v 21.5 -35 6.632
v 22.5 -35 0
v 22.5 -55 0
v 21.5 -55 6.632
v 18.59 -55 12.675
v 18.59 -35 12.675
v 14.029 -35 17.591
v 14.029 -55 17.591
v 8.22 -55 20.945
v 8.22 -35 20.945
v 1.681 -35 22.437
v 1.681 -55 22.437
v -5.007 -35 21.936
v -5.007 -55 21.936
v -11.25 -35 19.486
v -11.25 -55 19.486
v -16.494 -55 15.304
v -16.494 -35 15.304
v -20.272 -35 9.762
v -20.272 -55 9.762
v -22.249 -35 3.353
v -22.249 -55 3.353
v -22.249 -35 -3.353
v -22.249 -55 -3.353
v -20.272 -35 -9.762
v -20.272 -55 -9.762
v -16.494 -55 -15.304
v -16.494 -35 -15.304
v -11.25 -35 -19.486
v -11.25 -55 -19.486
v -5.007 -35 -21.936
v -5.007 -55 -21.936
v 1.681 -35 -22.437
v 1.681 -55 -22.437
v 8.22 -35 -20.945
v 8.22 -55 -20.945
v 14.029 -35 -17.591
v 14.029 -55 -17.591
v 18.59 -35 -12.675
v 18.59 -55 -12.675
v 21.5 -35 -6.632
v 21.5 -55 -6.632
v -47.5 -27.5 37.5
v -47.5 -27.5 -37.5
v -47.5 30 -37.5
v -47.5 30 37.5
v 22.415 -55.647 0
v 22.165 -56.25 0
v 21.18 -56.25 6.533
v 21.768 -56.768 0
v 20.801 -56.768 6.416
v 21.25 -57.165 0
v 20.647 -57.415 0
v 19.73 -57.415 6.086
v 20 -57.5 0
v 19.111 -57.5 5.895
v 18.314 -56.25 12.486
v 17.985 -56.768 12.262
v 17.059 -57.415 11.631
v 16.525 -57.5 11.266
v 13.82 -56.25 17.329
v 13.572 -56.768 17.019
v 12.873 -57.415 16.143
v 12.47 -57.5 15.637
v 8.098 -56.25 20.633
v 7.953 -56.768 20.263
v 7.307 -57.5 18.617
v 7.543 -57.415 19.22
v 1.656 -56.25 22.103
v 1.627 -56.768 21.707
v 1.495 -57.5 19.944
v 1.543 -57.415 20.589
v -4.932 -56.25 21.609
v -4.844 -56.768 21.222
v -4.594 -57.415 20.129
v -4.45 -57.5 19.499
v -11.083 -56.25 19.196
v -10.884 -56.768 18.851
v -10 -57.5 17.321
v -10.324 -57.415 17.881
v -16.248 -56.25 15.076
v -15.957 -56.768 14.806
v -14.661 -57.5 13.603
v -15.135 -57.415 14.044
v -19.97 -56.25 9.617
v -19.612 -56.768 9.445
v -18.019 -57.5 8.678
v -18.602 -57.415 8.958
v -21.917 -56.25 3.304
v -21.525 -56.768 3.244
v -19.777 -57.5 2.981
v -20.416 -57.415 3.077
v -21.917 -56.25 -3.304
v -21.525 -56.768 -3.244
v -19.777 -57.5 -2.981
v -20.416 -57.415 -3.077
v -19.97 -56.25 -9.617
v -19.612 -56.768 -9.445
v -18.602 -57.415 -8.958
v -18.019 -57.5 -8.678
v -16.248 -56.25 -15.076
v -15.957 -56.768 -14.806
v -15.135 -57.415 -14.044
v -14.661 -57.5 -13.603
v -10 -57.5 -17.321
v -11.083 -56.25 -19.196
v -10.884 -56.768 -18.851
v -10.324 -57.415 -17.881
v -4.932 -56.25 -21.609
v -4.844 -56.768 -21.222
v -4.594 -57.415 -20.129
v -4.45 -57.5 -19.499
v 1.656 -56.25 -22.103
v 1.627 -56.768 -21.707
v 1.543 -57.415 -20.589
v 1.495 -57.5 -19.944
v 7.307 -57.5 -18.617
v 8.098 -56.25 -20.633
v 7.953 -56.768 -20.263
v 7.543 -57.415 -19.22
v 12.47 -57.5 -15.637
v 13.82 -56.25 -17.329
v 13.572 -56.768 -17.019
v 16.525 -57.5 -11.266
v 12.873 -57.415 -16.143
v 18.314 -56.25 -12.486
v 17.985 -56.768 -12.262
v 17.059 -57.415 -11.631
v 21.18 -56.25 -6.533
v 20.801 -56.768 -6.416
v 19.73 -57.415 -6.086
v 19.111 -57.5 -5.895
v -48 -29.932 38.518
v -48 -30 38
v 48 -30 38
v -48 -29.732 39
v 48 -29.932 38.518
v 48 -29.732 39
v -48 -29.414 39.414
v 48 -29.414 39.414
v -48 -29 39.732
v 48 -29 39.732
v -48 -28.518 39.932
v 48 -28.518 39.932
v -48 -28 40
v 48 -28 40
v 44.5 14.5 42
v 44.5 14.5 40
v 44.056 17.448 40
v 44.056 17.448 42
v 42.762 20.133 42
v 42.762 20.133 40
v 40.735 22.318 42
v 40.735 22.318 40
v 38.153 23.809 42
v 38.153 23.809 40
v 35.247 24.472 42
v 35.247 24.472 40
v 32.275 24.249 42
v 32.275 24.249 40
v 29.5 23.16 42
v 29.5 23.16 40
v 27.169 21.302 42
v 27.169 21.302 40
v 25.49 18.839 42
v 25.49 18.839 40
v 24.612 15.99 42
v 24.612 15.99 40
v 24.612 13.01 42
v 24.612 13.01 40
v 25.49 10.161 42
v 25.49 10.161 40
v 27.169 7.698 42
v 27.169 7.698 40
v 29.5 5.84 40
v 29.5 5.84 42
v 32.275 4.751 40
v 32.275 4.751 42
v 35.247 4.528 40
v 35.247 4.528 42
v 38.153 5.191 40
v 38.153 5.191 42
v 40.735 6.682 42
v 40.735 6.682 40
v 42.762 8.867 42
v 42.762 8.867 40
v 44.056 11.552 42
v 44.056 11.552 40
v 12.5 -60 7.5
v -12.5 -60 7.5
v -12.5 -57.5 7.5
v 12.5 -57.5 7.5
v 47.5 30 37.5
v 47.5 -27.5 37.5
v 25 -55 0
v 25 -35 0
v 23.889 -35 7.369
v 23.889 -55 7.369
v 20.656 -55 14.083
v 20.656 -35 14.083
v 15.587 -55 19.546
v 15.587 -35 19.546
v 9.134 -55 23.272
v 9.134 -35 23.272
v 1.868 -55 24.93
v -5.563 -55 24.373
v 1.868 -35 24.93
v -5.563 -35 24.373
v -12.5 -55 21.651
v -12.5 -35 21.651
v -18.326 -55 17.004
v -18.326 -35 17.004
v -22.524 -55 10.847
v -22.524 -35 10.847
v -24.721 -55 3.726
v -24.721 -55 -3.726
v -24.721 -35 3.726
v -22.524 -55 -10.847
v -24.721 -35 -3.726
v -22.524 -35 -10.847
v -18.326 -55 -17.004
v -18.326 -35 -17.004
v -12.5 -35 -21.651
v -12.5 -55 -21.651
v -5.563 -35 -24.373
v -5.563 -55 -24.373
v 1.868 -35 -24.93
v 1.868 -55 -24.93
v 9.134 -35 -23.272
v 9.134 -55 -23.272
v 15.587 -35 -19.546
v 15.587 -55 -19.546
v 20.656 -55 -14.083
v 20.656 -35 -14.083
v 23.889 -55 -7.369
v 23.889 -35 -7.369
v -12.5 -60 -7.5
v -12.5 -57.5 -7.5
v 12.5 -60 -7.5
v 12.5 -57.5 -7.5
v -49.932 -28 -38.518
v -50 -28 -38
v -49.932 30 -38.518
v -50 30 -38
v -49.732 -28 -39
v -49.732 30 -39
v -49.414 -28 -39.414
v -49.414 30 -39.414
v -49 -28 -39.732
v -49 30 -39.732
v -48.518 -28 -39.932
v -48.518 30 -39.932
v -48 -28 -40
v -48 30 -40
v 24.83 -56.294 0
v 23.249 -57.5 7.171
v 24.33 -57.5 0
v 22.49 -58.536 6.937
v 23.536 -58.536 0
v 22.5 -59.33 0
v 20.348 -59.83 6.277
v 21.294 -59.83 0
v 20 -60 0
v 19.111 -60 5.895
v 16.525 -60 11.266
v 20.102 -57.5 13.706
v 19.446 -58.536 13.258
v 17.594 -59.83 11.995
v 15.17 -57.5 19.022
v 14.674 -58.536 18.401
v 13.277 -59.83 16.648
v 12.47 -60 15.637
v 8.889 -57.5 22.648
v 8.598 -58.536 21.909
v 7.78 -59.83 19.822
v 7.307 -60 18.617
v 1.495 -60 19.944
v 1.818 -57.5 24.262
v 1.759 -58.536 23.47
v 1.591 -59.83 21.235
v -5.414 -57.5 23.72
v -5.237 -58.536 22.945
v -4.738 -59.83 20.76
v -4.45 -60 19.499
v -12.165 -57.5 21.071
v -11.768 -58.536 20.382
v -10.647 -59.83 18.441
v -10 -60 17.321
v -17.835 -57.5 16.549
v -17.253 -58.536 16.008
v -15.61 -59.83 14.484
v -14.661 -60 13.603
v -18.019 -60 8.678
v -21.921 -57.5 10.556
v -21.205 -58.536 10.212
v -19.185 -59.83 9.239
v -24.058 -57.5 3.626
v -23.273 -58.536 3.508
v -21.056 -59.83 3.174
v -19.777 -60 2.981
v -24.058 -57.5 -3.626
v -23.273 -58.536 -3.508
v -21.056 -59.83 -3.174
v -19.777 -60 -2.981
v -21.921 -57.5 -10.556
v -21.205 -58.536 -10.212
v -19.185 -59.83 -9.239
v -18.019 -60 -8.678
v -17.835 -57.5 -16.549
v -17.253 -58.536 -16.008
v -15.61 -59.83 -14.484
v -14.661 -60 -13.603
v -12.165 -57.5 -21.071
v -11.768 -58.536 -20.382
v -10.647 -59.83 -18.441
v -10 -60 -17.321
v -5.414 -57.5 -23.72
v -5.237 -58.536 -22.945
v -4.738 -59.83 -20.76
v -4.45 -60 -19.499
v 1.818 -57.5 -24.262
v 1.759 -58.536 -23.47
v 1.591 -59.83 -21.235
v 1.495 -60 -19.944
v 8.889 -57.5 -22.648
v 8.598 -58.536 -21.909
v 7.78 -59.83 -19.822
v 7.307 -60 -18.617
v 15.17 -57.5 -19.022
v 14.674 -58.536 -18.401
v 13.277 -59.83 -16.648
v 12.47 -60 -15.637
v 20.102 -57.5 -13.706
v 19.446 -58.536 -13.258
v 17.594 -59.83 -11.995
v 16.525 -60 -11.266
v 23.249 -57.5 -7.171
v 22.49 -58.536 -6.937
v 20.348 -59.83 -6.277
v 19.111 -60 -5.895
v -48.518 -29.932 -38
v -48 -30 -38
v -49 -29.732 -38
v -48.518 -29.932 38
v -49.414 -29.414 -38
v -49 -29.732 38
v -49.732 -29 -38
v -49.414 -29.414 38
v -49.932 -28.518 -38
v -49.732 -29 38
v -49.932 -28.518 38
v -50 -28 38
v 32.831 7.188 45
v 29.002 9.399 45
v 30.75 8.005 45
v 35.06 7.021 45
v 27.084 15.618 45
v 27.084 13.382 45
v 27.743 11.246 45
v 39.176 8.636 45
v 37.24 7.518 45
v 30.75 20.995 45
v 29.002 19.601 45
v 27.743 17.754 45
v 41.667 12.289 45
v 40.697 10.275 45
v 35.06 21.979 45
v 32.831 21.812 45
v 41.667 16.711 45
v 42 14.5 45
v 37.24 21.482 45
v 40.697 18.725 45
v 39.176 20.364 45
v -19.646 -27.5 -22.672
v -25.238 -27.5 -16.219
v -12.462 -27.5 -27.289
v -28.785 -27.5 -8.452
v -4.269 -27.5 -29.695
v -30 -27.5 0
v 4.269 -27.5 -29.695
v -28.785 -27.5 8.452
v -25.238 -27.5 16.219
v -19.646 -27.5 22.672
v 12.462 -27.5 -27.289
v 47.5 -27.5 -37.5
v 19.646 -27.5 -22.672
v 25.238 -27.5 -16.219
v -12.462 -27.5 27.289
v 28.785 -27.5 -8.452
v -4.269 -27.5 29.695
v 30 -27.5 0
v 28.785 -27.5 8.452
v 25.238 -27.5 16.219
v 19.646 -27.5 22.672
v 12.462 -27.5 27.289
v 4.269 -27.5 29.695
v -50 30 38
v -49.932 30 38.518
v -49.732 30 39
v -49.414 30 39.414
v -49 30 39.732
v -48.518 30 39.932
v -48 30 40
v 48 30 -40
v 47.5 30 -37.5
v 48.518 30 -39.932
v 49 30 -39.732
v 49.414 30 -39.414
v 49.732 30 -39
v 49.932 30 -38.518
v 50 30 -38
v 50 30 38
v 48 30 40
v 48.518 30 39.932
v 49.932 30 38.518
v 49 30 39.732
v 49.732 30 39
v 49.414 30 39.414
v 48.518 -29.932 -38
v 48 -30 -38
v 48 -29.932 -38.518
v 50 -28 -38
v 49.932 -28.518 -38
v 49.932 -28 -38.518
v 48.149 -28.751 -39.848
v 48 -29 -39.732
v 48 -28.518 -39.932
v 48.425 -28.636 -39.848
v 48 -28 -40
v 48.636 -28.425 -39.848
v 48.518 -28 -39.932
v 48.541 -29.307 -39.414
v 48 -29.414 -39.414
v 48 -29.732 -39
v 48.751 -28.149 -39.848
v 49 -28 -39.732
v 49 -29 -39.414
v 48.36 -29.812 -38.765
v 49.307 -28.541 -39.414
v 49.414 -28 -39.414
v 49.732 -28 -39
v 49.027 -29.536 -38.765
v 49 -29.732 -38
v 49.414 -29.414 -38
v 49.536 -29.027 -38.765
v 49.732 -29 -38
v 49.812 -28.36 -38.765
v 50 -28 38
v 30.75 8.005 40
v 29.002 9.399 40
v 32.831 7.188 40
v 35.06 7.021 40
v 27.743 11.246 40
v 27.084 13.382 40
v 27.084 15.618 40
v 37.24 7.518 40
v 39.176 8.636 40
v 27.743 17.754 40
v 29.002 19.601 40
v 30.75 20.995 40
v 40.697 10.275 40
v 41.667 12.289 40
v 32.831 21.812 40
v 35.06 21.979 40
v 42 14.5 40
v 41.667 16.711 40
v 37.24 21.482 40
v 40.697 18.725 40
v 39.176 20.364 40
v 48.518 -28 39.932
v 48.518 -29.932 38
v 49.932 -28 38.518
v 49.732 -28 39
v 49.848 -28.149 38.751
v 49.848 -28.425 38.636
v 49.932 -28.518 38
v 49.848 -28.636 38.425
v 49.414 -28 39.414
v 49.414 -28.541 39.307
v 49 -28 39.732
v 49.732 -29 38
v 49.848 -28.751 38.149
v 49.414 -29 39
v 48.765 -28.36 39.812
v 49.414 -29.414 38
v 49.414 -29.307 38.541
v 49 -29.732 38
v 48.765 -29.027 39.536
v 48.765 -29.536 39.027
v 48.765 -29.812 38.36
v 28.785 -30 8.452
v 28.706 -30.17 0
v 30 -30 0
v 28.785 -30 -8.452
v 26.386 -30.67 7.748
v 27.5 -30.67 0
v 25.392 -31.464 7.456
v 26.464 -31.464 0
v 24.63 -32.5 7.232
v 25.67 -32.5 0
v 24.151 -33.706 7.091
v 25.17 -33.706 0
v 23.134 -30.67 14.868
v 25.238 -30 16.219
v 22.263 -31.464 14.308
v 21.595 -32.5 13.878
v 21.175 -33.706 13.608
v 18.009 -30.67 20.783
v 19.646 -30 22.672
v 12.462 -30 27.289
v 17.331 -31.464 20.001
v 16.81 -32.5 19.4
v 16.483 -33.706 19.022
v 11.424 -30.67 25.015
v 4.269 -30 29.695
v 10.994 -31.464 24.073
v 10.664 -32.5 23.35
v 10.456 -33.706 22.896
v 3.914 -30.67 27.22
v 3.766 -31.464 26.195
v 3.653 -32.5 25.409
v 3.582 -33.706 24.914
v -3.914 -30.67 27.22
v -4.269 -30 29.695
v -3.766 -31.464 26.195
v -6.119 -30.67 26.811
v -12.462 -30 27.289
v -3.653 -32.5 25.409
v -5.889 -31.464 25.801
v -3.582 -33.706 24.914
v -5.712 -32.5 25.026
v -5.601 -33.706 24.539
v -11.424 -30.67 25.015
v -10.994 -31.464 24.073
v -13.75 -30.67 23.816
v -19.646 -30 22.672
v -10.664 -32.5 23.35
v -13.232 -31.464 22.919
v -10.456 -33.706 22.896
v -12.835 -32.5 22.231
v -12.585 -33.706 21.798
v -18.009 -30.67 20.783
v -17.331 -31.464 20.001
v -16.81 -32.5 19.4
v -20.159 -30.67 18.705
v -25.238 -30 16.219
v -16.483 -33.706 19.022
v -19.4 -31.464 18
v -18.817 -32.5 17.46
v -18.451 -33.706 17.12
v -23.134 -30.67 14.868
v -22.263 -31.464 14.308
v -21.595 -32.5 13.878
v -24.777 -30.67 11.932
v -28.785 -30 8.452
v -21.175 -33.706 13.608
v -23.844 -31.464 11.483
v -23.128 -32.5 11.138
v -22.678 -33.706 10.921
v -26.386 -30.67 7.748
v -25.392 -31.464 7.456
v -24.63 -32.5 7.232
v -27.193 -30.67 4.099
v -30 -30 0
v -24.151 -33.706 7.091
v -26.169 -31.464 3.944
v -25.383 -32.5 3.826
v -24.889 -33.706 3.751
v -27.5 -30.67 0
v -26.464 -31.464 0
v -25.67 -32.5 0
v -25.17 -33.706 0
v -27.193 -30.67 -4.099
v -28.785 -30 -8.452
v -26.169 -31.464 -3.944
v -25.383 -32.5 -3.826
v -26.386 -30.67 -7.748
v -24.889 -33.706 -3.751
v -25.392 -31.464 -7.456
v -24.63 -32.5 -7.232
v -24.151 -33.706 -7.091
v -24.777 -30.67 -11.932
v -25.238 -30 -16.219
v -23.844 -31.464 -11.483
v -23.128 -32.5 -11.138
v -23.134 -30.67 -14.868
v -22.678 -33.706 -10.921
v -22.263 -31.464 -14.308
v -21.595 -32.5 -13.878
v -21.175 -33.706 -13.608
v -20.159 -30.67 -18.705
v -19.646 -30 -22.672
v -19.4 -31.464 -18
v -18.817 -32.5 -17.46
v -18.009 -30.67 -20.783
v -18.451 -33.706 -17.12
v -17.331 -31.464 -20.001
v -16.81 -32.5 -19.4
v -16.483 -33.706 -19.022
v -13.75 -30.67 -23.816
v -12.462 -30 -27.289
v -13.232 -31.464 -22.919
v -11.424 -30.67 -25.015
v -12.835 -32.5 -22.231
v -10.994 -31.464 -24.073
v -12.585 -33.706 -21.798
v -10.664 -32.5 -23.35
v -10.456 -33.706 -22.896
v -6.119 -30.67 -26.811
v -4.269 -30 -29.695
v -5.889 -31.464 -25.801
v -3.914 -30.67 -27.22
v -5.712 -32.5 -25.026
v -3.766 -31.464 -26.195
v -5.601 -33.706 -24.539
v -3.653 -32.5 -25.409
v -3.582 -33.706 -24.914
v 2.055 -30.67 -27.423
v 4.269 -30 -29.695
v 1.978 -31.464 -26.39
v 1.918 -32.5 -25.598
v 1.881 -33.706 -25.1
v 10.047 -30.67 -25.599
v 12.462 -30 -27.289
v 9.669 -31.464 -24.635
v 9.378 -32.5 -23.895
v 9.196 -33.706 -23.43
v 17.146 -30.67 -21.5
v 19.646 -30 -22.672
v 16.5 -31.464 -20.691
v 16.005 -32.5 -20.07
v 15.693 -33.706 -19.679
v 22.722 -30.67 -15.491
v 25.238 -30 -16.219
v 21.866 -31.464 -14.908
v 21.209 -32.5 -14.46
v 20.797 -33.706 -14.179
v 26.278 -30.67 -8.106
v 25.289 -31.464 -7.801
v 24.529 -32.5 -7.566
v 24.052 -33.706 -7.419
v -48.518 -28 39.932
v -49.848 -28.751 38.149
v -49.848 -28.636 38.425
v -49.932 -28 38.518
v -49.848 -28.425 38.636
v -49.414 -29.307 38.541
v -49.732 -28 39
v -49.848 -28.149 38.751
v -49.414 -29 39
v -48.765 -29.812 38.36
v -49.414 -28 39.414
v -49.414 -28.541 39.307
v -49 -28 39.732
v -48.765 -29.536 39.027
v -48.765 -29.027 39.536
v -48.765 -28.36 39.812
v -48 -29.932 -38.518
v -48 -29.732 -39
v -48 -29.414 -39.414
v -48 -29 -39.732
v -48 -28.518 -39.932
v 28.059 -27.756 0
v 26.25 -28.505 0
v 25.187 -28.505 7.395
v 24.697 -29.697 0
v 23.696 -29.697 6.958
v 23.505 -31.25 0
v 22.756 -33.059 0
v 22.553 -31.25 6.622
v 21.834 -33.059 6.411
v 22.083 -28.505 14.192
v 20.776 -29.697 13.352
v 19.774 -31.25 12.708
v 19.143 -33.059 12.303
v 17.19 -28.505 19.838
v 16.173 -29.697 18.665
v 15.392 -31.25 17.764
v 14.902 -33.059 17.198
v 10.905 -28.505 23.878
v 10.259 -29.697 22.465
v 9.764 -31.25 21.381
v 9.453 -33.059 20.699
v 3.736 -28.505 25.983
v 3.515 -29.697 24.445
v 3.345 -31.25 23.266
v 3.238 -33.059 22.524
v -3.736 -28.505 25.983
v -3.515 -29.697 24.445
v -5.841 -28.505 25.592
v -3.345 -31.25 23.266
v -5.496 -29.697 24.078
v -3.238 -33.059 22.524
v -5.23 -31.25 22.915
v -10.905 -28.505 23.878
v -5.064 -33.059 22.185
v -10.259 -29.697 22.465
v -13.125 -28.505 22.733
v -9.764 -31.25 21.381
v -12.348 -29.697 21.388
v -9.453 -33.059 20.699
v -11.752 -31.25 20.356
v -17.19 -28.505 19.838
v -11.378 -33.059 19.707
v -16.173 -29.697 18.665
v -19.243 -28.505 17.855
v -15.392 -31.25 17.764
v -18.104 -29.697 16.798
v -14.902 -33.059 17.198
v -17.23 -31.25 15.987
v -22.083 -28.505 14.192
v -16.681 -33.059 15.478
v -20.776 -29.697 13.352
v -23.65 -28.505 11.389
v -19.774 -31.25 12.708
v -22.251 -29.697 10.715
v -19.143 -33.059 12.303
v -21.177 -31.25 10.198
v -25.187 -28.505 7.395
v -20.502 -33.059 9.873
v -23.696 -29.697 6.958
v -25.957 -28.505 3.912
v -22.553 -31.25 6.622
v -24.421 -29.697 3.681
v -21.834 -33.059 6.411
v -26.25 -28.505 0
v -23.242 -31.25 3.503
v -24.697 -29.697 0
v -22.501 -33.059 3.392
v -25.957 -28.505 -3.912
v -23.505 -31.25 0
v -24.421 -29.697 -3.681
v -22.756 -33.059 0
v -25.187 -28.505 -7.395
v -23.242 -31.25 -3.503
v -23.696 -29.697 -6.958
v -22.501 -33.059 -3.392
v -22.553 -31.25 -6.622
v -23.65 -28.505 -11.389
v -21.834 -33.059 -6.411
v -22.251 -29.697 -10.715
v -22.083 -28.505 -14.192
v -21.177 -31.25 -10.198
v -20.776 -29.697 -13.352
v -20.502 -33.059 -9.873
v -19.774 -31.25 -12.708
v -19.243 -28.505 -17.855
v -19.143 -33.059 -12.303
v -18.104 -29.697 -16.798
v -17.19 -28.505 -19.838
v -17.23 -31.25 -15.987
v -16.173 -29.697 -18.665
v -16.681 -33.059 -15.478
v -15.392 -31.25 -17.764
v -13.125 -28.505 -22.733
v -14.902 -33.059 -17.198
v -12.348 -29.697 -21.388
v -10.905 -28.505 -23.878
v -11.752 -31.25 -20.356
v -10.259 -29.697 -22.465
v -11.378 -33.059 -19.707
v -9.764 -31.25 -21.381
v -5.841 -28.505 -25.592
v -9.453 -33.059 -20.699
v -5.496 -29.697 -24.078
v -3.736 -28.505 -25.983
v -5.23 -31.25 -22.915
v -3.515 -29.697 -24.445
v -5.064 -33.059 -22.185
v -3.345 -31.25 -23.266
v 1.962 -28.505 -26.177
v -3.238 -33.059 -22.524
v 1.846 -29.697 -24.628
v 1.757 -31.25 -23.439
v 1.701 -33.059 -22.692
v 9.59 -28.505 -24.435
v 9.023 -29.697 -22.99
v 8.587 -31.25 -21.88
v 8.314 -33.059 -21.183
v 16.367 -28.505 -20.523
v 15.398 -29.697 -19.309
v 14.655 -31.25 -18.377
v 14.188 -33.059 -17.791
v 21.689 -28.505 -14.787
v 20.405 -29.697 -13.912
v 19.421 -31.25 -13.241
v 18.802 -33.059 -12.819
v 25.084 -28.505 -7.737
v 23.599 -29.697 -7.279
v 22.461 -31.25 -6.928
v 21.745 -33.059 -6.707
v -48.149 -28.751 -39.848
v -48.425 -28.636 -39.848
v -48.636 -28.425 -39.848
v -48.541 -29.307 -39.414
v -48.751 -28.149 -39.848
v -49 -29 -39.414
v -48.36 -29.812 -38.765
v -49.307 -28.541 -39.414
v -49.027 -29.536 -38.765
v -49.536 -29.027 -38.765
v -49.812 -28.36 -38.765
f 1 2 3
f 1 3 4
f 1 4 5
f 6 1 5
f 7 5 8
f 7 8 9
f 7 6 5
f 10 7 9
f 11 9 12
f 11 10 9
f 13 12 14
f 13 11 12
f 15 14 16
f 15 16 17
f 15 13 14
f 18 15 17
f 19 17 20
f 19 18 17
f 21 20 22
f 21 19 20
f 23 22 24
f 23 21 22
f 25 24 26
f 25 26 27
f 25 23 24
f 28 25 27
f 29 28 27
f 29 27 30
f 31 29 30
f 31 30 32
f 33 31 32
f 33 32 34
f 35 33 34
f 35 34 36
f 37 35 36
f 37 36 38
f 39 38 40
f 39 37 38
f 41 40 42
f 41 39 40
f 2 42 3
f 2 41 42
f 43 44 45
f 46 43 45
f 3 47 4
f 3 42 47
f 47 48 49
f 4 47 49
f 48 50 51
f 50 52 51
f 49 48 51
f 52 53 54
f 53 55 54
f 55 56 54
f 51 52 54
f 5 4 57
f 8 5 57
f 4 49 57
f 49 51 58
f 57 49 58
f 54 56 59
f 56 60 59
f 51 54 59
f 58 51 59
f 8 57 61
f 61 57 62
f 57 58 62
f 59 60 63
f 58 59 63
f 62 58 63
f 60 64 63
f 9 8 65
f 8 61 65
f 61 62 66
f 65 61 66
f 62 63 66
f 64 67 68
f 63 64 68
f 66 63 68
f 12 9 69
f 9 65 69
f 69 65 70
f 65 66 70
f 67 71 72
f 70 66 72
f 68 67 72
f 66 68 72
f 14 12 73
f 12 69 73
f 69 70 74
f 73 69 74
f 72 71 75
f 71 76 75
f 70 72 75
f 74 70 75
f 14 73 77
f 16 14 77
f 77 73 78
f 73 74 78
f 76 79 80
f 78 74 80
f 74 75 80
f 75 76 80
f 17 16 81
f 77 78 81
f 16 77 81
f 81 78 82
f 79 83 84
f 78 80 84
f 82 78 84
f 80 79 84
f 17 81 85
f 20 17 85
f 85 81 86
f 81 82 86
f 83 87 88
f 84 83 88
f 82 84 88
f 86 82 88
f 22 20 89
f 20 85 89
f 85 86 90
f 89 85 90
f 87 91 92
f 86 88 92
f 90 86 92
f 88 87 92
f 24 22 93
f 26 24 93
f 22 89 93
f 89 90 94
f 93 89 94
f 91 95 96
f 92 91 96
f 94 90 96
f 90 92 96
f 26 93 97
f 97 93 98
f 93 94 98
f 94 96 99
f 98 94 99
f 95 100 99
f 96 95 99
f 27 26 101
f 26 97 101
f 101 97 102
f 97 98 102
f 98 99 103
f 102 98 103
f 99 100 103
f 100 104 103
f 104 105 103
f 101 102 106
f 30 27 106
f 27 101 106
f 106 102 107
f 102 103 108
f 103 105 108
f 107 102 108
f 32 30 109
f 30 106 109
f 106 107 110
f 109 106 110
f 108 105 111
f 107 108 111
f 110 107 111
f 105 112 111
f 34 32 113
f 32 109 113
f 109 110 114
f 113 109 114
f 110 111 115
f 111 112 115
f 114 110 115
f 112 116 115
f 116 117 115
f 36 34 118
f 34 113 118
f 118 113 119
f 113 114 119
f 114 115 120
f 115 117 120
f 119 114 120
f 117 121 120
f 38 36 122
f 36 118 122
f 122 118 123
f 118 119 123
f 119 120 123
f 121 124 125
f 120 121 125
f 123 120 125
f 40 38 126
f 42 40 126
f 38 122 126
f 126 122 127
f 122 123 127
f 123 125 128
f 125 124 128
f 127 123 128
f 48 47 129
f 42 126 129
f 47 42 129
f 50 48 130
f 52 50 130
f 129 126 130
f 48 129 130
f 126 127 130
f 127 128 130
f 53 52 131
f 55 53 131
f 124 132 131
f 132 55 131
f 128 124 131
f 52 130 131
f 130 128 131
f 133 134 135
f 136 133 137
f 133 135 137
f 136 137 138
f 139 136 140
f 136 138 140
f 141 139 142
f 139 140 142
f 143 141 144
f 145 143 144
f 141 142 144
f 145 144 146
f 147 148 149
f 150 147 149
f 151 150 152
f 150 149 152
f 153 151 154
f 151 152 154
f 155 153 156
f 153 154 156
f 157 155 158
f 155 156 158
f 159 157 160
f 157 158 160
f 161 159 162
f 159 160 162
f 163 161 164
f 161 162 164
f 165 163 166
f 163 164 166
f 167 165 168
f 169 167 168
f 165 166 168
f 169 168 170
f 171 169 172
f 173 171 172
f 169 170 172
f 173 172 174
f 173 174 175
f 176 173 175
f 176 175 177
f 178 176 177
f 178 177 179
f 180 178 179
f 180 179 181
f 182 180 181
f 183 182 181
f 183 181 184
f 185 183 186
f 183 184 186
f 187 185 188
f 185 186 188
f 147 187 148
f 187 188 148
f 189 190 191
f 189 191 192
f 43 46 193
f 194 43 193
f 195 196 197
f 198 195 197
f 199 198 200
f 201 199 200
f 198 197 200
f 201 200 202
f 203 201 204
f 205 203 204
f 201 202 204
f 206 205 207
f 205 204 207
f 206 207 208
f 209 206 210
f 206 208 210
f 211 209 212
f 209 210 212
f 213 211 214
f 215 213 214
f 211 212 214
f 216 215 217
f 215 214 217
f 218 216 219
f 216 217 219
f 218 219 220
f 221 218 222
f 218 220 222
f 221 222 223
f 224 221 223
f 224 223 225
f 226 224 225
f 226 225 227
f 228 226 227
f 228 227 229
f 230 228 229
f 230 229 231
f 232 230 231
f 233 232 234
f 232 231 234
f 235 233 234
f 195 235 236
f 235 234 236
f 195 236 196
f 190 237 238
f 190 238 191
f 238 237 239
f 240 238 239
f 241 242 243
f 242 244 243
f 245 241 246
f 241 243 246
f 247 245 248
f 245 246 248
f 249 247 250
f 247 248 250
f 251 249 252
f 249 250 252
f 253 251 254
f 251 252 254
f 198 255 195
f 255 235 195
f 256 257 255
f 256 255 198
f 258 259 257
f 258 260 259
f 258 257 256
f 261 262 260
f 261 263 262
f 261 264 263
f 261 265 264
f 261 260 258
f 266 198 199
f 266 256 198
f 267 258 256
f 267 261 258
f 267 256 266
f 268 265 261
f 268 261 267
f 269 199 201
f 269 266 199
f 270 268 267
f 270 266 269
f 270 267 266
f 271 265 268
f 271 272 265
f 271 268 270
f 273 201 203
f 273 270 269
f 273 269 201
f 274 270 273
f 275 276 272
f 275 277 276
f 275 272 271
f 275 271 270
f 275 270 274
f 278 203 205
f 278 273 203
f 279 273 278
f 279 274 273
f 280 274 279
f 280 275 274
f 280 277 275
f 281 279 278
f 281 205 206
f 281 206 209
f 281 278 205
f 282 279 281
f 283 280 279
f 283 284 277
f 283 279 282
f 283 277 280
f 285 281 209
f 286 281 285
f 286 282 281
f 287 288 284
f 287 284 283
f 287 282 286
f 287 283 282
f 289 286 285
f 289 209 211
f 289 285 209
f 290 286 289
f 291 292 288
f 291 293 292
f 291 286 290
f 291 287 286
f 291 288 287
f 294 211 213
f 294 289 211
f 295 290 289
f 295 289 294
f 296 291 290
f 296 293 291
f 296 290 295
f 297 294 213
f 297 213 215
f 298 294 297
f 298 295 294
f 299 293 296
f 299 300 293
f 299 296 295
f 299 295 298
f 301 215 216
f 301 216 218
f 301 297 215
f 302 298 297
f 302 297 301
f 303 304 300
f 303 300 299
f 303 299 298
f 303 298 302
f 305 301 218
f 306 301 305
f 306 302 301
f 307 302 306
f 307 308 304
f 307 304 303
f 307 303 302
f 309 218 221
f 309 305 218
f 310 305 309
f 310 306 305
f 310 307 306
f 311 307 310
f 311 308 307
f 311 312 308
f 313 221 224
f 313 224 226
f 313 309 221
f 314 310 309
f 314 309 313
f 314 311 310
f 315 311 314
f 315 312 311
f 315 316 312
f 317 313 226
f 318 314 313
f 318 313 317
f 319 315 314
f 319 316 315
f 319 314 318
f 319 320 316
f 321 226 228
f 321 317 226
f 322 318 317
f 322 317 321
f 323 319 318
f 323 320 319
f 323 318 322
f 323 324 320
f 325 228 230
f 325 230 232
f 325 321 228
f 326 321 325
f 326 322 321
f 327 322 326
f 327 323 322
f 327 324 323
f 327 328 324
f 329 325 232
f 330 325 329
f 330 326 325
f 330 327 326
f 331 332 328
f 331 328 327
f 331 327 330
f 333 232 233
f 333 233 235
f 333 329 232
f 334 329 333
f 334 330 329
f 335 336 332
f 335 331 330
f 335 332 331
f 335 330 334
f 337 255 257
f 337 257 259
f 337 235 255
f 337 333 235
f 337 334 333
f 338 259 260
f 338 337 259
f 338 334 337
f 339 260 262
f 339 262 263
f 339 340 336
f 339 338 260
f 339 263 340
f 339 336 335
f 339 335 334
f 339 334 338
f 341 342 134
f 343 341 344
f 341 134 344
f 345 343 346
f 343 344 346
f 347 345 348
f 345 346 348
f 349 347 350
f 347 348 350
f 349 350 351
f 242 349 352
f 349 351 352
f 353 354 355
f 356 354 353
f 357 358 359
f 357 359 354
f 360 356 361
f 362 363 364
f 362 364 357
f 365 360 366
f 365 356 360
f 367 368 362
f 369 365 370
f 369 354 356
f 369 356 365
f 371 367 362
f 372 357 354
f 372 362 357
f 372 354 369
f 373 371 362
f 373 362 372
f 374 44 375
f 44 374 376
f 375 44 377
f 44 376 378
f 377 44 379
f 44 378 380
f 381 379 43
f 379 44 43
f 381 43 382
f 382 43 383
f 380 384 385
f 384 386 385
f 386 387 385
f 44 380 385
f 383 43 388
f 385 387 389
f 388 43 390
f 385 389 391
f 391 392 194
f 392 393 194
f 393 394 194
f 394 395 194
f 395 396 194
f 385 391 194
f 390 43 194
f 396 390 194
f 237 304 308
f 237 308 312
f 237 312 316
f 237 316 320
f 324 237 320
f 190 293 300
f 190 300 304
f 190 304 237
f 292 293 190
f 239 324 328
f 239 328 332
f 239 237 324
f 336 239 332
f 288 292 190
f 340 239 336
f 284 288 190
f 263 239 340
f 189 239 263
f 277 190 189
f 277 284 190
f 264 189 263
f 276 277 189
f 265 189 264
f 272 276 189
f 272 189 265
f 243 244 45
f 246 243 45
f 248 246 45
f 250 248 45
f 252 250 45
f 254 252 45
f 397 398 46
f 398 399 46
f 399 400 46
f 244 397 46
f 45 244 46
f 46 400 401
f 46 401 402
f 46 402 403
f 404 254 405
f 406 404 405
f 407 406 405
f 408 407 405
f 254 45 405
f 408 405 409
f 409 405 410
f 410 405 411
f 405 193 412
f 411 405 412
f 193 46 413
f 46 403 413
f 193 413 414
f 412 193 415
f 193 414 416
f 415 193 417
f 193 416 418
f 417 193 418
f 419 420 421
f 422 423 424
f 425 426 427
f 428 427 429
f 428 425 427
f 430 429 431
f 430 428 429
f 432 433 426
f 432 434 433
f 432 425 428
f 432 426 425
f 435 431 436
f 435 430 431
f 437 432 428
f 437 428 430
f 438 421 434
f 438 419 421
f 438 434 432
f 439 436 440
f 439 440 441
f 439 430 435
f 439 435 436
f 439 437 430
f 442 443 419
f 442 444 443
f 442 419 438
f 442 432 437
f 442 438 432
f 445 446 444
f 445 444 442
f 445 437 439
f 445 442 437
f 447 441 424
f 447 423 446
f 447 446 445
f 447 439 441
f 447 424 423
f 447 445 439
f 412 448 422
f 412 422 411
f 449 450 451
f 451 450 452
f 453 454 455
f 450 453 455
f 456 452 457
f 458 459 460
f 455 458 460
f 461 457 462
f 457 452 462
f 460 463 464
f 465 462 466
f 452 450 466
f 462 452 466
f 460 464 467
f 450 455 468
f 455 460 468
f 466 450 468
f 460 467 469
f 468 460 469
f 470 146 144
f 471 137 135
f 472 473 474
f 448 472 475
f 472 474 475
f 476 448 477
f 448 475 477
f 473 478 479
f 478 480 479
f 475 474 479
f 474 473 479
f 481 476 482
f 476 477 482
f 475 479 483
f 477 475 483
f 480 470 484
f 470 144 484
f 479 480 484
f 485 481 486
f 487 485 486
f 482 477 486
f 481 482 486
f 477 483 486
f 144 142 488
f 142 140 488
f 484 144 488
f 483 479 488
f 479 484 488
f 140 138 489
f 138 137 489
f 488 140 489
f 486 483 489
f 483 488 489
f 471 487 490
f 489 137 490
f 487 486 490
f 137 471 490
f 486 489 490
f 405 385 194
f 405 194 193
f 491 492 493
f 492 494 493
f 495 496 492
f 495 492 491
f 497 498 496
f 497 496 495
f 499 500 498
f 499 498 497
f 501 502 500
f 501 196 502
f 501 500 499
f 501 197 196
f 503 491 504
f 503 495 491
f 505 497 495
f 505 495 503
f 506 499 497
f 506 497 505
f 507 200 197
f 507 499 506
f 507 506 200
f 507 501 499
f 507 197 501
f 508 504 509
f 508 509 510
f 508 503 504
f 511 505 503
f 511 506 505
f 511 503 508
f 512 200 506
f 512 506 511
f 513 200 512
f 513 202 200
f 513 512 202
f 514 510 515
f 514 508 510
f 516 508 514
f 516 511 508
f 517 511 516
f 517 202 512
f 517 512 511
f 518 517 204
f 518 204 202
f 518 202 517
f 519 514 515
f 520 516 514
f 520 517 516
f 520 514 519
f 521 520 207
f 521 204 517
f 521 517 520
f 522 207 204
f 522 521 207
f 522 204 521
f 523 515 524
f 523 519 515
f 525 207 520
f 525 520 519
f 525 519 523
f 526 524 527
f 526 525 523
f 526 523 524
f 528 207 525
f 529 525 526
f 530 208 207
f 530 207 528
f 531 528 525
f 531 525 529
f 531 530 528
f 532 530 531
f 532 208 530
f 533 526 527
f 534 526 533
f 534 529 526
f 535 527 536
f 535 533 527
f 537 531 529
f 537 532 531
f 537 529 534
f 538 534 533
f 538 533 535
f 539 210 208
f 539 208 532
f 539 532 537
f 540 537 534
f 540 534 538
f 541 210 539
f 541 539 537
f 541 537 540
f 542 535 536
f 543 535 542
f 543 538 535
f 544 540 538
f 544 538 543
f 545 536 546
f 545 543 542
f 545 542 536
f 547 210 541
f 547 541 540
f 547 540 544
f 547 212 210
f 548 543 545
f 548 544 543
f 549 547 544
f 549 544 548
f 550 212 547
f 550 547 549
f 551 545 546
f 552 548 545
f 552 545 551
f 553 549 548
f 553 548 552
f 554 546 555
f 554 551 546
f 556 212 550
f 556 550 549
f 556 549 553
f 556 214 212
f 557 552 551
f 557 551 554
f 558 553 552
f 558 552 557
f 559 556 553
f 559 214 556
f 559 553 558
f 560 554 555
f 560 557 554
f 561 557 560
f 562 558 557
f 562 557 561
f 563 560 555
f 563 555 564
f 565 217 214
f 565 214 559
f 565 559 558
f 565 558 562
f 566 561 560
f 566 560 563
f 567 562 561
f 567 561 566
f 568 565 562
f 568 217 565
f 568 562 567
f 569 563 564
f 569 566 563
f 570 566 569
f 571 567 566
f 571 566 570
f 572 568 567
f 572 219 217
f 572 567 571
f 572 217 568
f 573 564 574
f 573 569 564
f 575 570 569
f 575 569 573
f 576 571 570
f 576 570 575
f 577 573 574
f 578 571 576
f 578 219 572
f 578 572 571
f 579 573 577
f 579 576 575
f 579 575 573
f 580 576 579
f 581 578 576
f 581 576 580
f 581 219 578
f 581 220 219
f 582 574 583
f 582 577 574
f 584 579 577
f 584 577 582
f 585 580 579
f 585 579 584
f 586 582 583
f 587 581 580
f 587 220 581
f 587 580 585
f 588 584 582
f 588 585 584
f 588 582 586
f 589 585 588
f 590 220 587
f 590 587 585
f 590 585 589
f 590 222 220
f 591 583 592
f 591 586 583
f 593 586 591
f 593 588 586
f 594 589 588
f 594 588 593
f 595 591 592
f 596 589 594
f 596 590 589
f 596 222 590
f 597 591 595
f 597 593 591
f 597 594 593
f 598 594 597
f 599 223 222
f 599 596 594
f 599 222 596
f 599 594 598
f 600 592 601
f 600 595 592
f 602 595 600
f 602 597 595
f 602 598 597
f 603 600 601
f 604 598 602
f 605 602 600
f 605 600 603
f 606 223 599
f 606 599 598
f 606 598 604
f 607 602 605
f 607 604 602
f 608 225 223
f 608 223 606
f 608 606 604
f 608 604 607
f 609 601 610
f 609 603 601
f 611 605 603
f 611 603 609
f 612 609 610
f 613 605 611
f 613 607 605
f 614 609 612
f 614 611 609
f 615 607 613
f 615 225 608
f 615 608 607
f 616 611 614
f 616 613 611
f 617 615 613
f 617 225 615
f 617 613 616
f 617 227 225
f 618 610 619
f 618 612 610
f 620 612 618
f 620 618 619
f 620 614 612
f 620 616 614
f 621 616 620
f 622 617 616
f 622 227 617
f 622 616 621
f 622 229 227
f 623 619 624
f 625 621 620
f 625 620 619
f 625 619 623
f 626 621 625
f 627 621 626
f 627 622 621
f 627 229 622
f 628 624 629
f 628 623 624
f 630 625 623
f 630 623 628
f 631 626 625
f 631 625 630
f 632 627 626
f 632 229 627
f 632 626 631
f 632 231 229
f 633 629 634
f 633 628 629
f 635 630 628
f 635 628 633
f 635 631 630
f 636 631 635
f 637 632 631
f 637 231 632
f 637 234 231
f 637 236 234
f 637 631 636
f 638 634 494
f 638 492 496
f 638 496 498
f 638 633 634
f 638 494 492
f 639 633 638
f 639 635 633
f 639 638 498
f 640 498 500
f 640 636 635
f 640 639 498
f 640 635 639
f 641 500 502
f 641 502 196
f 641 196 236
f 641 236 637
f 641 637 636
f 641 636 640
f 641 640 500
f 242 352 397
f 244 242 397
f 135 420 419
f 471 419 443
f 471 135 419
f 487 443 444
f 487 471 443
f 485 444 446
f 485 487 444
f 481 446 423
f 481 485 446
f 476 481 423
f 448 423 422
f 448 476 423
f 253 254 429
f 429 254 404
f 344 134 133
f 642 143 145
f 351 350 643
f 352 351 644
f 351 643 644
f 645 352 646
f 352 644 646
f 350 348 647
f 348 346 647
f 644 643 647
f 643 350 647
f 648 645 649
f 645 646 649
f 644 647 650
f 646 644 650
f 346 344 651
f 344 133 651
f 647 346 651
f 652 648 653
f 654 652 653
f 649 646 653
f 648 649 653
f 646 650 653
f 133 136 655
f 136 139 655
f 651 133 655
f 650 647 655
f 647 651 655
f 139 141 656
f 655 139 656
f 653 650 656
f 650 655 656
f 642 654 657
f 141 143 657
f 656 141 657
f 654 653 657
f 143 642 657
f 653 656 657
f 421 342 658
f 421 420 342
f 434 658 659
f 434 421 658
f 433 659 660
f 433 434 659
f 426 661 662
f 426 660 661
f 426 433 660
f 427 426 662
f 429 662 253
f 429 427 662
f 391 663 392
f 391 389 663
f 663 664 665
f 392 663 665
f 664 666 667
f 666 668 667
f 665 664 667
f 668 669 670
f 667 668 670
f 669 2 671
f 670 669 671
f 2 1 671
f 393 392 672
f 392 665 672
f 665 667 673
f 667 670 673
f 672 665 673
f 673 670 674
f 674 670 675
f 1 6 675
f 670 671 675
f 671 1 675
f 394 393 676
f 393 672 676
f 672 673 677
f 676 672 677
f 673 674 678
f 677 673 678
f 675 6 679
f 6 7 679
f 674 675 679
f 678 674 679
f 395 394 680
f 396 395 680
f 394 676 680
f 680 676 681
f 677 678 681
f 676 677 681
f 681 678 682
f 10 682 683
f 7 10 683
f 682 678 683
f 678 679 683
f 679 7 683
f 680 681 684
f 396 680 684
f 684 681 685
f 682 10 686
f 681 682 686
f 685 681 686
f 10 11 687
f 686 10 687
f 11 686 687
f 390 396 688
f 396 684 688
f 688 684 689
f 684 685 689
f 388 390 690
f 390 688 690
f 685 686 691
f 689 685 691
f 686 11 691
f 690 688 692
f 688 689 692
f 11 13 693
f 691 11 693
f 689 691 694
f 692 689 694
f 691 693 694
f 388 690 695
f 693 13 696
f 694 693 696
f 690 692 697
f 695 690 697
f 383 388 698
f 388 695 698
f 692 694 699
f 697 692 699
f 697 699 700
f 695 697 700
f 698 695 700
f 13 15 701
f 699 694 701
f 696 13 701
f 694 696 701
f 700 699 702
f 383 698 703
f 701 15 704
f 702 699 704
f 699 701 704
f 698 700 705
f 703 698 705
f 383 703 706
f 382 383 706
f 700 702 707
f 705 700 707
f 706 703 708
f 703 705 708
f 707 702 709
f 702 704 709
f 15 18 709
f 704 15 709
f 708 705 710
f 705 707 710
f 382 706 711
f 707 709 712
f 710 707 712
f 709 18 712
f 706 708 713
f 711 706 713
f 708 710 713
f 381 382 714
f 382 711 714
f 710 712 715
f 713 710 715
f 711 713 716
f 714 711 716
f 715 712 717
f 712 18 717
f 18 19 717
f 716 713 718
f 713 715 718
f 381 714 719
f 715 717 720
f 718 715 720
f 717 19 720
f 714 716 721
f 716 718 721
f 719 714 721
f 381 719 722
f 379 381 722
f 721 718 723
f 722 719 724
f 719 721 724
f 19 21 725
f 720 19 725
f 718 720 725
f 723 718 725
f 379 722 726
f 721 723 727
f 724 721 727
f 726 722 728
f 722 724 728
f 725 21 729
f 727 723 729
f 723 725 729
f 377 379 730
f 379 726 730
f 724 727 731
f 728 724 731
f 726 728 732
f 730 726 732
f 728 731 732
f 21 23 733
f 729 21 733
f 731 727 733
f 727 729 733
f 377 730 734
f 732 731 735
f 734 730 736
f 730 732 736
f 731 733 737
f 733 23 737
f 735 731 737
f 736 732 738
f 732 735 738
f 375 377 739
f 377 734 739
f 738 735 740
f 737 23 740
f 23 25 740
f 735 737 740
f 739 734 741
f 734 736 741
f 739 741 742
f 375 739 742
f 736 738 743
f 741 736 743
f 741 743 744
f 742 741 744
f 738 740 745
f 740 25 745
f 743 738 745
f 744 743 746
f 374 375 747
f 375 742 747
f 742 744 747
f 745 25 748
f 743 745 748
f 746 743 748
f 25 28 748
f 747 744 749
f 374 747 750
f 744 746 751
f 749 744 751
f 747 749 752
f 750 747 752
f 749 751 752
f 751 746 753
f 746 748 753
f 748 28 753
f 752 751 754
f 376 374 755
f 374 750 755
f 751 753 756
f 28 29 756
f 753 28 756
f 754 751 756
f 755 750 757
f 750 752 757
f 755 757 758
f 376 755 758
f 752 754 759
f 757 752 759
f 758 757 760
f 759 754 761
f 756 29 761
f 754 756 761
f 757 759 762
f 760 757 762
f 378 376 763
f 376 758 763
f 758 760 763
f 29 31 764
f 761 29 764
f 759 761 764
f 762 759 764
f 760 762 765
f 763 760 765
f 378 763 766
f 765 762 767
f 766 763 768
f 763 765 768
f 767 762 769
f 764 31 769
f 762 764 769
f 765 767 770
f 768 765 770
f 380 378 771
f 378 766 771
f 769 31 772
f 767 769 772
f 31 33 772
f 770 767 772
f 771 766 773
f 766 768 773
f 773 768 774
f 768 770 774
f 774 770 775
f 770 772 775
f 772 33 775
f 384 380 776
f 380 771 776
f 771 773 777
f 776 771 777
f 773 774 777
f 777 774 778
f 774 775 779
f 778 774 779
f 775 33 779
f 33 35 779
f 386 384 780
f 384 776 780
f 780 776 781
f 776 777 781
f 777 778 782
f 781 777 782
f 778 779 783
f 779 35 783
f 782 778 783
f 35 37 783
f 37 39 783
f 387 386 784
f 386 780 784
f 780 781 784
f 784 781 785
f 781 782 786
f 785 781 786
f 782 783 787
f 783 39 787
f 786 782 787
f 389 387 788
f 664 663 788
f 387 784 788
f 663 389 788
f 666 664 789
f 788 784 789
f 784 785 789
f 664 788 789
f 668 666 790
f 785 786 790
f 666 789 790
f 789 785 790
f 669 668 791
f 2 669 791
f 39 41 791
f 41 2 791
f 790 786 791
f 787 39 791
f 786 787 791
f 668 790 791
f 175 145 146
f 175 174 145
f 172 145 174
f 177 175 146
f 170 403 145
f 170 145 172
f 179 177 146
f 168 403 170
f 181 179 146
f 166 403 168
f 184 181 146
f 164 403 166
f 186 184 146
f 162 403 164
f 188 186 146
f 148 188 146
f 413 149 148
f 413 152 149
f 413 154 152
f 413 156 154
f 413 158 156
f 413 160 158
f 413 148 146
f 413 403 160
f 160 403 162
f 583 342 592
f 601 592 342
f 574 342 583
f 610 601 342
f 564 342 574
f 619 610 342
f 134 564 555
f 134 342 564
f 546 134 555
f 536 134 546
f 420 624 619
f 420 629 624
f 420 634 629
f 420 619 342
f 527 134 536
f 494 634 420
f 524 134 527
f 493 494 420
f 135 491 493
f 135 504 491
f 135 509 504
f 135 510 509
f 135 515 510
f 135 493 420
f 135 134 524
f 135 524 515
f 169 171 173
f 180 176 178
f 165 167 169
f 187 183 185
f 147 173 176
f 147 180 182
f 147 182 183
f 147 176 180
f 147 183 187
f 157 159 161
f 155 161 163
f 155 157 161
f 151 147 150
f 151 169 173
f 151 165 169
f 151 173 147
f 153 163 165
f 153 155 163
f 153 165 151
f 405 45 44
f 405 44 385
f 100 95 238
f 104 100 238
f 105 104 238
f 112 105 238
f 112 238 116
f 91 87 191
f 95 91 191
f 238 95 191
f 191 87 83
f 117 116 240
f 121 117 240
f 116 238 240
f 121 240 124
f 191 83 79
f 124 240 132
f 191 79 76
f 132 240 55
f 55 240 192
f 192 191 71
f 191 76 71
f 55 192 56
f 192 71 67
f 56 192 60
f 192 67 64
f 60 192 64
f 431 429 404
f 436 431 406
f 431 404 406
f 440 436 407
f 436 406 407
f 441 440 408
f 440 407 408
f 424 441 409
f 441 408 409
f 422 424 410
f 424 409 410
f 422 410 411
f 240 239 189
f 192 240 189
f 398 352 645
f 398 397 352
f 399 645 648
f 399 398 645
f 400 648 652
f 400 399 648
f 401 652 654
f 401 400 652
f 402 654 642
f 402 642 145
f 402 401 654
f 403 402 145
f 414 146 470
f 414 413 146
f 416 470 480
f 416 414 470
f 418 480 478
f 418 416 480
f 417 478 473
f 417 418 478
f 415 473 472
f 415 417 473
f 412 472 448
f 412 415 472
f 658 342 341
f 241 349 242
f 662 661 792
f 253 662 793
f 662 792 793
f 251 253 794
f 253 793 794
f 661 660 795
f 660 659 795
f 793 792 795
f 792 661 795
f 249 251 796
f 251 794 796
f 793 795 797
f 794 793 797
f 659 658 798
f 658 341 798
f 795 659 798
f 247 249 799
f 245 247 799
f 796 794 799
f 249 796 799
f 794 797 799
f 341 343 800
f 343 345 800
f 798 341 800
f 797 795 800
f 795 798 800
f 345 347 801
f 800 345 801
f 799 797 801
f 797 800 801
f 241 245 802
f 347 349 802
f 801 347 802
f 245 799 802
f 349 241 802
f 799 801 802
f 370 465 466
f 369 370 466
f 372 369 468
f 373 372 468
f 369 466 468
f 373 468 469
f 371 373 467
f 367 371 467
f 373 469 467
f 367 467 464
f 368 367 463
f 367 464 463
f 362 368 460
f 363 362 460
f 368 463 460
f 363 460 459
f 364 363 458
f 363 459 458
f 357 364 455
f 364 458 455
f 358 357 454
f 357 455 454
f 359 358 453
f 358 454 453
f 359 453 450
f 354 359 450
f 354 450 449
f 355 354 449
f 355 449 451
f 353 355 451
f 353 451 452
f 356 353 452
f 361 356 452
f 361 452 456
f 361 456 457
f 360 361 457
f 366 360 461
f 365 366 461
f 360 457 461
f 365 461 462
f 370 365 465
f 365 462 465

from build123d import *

# Parameters (mm, degrees)
F0_W      = 100
F0_H      = 60
F1_DEPTH  = 40
F2_R      = 25
F3_DEPTH  = 30
F5_R      = 5
F6_T      = -2.5
F4_W      = 25
F4_H      = 15
F7_DEPTH  = 90.001
F8_R      = 2
F9_R      = 7.5
F10_DEPTH = 5
F11_R     = 10
F12_DEPTH = 2


with BuildPart() as f1:
    # F0 (on Top) → F1 (new body, symmetric)
    with BuildSketch(Plane.XY):
        Rectangle(F0_W, F0_H)
    extrude(amount=F1_DEPTH, both=True)

    # F2 (on face) → F3 (join)
    with BuildSketch(Plane.XZ.offset(30)):
        Circle(F2_R)
    extrude(amount=F3_DEPTH)

    # F5
    f5_edges = [f1.edges().sort_by_distance(p)[0] for p in [
        (-25, -60, 0),
        (-25, -30, 0),
    ]]
    fillet(f5_edges, radius=F5_R)

    # F6
    f6_openings = [f1.faces().sort_by_distance(p)[0] for p in [
        (0, 30, 0),
    ]]
    offset(amount=F6_T, openings=f6_openings)

    # F4 (on face) → F7 (cut, through all)
    with BuildSketch(Plane.XZ.offset(60)):
        Rectangle(F4_W, F4_H)
    extrude(amount=-F7_DEPTH, mode=Mode.SUBTRACT)

    # F8
    f8_edges = [f1.edges().sort_by_distance(p)[0] for p in [
        (0, -30, 40),
        (50, 0, 40),
        (50, -30, 0),
        (-50, -30, 0),
        (0, -30, -40),
        (-50, 0, -40),
        (50, 0, -40),
        (-50, 0, 40),
    ]]
    fillet(f8_edges, radius=F8_R)

    # F11 (on face) → F12 (join)
    with BuildSketch(Plane.XY.offset(40)):
        with Locations((34.5, 14.5)):
            Circle(F11_R)
    extrude(amount=F12_DEPTH)


with BuildPart() as f10:
    # F9 (on face) → F10 (new body)
    with BuildSketch(Plane.XY.offset(40)):
        with Locations((34.5, 14.5)):
            Circle(F9_R)
    extrude(amount=F10_DEPTH)


solid = Compound([f1.part, f10.part])
